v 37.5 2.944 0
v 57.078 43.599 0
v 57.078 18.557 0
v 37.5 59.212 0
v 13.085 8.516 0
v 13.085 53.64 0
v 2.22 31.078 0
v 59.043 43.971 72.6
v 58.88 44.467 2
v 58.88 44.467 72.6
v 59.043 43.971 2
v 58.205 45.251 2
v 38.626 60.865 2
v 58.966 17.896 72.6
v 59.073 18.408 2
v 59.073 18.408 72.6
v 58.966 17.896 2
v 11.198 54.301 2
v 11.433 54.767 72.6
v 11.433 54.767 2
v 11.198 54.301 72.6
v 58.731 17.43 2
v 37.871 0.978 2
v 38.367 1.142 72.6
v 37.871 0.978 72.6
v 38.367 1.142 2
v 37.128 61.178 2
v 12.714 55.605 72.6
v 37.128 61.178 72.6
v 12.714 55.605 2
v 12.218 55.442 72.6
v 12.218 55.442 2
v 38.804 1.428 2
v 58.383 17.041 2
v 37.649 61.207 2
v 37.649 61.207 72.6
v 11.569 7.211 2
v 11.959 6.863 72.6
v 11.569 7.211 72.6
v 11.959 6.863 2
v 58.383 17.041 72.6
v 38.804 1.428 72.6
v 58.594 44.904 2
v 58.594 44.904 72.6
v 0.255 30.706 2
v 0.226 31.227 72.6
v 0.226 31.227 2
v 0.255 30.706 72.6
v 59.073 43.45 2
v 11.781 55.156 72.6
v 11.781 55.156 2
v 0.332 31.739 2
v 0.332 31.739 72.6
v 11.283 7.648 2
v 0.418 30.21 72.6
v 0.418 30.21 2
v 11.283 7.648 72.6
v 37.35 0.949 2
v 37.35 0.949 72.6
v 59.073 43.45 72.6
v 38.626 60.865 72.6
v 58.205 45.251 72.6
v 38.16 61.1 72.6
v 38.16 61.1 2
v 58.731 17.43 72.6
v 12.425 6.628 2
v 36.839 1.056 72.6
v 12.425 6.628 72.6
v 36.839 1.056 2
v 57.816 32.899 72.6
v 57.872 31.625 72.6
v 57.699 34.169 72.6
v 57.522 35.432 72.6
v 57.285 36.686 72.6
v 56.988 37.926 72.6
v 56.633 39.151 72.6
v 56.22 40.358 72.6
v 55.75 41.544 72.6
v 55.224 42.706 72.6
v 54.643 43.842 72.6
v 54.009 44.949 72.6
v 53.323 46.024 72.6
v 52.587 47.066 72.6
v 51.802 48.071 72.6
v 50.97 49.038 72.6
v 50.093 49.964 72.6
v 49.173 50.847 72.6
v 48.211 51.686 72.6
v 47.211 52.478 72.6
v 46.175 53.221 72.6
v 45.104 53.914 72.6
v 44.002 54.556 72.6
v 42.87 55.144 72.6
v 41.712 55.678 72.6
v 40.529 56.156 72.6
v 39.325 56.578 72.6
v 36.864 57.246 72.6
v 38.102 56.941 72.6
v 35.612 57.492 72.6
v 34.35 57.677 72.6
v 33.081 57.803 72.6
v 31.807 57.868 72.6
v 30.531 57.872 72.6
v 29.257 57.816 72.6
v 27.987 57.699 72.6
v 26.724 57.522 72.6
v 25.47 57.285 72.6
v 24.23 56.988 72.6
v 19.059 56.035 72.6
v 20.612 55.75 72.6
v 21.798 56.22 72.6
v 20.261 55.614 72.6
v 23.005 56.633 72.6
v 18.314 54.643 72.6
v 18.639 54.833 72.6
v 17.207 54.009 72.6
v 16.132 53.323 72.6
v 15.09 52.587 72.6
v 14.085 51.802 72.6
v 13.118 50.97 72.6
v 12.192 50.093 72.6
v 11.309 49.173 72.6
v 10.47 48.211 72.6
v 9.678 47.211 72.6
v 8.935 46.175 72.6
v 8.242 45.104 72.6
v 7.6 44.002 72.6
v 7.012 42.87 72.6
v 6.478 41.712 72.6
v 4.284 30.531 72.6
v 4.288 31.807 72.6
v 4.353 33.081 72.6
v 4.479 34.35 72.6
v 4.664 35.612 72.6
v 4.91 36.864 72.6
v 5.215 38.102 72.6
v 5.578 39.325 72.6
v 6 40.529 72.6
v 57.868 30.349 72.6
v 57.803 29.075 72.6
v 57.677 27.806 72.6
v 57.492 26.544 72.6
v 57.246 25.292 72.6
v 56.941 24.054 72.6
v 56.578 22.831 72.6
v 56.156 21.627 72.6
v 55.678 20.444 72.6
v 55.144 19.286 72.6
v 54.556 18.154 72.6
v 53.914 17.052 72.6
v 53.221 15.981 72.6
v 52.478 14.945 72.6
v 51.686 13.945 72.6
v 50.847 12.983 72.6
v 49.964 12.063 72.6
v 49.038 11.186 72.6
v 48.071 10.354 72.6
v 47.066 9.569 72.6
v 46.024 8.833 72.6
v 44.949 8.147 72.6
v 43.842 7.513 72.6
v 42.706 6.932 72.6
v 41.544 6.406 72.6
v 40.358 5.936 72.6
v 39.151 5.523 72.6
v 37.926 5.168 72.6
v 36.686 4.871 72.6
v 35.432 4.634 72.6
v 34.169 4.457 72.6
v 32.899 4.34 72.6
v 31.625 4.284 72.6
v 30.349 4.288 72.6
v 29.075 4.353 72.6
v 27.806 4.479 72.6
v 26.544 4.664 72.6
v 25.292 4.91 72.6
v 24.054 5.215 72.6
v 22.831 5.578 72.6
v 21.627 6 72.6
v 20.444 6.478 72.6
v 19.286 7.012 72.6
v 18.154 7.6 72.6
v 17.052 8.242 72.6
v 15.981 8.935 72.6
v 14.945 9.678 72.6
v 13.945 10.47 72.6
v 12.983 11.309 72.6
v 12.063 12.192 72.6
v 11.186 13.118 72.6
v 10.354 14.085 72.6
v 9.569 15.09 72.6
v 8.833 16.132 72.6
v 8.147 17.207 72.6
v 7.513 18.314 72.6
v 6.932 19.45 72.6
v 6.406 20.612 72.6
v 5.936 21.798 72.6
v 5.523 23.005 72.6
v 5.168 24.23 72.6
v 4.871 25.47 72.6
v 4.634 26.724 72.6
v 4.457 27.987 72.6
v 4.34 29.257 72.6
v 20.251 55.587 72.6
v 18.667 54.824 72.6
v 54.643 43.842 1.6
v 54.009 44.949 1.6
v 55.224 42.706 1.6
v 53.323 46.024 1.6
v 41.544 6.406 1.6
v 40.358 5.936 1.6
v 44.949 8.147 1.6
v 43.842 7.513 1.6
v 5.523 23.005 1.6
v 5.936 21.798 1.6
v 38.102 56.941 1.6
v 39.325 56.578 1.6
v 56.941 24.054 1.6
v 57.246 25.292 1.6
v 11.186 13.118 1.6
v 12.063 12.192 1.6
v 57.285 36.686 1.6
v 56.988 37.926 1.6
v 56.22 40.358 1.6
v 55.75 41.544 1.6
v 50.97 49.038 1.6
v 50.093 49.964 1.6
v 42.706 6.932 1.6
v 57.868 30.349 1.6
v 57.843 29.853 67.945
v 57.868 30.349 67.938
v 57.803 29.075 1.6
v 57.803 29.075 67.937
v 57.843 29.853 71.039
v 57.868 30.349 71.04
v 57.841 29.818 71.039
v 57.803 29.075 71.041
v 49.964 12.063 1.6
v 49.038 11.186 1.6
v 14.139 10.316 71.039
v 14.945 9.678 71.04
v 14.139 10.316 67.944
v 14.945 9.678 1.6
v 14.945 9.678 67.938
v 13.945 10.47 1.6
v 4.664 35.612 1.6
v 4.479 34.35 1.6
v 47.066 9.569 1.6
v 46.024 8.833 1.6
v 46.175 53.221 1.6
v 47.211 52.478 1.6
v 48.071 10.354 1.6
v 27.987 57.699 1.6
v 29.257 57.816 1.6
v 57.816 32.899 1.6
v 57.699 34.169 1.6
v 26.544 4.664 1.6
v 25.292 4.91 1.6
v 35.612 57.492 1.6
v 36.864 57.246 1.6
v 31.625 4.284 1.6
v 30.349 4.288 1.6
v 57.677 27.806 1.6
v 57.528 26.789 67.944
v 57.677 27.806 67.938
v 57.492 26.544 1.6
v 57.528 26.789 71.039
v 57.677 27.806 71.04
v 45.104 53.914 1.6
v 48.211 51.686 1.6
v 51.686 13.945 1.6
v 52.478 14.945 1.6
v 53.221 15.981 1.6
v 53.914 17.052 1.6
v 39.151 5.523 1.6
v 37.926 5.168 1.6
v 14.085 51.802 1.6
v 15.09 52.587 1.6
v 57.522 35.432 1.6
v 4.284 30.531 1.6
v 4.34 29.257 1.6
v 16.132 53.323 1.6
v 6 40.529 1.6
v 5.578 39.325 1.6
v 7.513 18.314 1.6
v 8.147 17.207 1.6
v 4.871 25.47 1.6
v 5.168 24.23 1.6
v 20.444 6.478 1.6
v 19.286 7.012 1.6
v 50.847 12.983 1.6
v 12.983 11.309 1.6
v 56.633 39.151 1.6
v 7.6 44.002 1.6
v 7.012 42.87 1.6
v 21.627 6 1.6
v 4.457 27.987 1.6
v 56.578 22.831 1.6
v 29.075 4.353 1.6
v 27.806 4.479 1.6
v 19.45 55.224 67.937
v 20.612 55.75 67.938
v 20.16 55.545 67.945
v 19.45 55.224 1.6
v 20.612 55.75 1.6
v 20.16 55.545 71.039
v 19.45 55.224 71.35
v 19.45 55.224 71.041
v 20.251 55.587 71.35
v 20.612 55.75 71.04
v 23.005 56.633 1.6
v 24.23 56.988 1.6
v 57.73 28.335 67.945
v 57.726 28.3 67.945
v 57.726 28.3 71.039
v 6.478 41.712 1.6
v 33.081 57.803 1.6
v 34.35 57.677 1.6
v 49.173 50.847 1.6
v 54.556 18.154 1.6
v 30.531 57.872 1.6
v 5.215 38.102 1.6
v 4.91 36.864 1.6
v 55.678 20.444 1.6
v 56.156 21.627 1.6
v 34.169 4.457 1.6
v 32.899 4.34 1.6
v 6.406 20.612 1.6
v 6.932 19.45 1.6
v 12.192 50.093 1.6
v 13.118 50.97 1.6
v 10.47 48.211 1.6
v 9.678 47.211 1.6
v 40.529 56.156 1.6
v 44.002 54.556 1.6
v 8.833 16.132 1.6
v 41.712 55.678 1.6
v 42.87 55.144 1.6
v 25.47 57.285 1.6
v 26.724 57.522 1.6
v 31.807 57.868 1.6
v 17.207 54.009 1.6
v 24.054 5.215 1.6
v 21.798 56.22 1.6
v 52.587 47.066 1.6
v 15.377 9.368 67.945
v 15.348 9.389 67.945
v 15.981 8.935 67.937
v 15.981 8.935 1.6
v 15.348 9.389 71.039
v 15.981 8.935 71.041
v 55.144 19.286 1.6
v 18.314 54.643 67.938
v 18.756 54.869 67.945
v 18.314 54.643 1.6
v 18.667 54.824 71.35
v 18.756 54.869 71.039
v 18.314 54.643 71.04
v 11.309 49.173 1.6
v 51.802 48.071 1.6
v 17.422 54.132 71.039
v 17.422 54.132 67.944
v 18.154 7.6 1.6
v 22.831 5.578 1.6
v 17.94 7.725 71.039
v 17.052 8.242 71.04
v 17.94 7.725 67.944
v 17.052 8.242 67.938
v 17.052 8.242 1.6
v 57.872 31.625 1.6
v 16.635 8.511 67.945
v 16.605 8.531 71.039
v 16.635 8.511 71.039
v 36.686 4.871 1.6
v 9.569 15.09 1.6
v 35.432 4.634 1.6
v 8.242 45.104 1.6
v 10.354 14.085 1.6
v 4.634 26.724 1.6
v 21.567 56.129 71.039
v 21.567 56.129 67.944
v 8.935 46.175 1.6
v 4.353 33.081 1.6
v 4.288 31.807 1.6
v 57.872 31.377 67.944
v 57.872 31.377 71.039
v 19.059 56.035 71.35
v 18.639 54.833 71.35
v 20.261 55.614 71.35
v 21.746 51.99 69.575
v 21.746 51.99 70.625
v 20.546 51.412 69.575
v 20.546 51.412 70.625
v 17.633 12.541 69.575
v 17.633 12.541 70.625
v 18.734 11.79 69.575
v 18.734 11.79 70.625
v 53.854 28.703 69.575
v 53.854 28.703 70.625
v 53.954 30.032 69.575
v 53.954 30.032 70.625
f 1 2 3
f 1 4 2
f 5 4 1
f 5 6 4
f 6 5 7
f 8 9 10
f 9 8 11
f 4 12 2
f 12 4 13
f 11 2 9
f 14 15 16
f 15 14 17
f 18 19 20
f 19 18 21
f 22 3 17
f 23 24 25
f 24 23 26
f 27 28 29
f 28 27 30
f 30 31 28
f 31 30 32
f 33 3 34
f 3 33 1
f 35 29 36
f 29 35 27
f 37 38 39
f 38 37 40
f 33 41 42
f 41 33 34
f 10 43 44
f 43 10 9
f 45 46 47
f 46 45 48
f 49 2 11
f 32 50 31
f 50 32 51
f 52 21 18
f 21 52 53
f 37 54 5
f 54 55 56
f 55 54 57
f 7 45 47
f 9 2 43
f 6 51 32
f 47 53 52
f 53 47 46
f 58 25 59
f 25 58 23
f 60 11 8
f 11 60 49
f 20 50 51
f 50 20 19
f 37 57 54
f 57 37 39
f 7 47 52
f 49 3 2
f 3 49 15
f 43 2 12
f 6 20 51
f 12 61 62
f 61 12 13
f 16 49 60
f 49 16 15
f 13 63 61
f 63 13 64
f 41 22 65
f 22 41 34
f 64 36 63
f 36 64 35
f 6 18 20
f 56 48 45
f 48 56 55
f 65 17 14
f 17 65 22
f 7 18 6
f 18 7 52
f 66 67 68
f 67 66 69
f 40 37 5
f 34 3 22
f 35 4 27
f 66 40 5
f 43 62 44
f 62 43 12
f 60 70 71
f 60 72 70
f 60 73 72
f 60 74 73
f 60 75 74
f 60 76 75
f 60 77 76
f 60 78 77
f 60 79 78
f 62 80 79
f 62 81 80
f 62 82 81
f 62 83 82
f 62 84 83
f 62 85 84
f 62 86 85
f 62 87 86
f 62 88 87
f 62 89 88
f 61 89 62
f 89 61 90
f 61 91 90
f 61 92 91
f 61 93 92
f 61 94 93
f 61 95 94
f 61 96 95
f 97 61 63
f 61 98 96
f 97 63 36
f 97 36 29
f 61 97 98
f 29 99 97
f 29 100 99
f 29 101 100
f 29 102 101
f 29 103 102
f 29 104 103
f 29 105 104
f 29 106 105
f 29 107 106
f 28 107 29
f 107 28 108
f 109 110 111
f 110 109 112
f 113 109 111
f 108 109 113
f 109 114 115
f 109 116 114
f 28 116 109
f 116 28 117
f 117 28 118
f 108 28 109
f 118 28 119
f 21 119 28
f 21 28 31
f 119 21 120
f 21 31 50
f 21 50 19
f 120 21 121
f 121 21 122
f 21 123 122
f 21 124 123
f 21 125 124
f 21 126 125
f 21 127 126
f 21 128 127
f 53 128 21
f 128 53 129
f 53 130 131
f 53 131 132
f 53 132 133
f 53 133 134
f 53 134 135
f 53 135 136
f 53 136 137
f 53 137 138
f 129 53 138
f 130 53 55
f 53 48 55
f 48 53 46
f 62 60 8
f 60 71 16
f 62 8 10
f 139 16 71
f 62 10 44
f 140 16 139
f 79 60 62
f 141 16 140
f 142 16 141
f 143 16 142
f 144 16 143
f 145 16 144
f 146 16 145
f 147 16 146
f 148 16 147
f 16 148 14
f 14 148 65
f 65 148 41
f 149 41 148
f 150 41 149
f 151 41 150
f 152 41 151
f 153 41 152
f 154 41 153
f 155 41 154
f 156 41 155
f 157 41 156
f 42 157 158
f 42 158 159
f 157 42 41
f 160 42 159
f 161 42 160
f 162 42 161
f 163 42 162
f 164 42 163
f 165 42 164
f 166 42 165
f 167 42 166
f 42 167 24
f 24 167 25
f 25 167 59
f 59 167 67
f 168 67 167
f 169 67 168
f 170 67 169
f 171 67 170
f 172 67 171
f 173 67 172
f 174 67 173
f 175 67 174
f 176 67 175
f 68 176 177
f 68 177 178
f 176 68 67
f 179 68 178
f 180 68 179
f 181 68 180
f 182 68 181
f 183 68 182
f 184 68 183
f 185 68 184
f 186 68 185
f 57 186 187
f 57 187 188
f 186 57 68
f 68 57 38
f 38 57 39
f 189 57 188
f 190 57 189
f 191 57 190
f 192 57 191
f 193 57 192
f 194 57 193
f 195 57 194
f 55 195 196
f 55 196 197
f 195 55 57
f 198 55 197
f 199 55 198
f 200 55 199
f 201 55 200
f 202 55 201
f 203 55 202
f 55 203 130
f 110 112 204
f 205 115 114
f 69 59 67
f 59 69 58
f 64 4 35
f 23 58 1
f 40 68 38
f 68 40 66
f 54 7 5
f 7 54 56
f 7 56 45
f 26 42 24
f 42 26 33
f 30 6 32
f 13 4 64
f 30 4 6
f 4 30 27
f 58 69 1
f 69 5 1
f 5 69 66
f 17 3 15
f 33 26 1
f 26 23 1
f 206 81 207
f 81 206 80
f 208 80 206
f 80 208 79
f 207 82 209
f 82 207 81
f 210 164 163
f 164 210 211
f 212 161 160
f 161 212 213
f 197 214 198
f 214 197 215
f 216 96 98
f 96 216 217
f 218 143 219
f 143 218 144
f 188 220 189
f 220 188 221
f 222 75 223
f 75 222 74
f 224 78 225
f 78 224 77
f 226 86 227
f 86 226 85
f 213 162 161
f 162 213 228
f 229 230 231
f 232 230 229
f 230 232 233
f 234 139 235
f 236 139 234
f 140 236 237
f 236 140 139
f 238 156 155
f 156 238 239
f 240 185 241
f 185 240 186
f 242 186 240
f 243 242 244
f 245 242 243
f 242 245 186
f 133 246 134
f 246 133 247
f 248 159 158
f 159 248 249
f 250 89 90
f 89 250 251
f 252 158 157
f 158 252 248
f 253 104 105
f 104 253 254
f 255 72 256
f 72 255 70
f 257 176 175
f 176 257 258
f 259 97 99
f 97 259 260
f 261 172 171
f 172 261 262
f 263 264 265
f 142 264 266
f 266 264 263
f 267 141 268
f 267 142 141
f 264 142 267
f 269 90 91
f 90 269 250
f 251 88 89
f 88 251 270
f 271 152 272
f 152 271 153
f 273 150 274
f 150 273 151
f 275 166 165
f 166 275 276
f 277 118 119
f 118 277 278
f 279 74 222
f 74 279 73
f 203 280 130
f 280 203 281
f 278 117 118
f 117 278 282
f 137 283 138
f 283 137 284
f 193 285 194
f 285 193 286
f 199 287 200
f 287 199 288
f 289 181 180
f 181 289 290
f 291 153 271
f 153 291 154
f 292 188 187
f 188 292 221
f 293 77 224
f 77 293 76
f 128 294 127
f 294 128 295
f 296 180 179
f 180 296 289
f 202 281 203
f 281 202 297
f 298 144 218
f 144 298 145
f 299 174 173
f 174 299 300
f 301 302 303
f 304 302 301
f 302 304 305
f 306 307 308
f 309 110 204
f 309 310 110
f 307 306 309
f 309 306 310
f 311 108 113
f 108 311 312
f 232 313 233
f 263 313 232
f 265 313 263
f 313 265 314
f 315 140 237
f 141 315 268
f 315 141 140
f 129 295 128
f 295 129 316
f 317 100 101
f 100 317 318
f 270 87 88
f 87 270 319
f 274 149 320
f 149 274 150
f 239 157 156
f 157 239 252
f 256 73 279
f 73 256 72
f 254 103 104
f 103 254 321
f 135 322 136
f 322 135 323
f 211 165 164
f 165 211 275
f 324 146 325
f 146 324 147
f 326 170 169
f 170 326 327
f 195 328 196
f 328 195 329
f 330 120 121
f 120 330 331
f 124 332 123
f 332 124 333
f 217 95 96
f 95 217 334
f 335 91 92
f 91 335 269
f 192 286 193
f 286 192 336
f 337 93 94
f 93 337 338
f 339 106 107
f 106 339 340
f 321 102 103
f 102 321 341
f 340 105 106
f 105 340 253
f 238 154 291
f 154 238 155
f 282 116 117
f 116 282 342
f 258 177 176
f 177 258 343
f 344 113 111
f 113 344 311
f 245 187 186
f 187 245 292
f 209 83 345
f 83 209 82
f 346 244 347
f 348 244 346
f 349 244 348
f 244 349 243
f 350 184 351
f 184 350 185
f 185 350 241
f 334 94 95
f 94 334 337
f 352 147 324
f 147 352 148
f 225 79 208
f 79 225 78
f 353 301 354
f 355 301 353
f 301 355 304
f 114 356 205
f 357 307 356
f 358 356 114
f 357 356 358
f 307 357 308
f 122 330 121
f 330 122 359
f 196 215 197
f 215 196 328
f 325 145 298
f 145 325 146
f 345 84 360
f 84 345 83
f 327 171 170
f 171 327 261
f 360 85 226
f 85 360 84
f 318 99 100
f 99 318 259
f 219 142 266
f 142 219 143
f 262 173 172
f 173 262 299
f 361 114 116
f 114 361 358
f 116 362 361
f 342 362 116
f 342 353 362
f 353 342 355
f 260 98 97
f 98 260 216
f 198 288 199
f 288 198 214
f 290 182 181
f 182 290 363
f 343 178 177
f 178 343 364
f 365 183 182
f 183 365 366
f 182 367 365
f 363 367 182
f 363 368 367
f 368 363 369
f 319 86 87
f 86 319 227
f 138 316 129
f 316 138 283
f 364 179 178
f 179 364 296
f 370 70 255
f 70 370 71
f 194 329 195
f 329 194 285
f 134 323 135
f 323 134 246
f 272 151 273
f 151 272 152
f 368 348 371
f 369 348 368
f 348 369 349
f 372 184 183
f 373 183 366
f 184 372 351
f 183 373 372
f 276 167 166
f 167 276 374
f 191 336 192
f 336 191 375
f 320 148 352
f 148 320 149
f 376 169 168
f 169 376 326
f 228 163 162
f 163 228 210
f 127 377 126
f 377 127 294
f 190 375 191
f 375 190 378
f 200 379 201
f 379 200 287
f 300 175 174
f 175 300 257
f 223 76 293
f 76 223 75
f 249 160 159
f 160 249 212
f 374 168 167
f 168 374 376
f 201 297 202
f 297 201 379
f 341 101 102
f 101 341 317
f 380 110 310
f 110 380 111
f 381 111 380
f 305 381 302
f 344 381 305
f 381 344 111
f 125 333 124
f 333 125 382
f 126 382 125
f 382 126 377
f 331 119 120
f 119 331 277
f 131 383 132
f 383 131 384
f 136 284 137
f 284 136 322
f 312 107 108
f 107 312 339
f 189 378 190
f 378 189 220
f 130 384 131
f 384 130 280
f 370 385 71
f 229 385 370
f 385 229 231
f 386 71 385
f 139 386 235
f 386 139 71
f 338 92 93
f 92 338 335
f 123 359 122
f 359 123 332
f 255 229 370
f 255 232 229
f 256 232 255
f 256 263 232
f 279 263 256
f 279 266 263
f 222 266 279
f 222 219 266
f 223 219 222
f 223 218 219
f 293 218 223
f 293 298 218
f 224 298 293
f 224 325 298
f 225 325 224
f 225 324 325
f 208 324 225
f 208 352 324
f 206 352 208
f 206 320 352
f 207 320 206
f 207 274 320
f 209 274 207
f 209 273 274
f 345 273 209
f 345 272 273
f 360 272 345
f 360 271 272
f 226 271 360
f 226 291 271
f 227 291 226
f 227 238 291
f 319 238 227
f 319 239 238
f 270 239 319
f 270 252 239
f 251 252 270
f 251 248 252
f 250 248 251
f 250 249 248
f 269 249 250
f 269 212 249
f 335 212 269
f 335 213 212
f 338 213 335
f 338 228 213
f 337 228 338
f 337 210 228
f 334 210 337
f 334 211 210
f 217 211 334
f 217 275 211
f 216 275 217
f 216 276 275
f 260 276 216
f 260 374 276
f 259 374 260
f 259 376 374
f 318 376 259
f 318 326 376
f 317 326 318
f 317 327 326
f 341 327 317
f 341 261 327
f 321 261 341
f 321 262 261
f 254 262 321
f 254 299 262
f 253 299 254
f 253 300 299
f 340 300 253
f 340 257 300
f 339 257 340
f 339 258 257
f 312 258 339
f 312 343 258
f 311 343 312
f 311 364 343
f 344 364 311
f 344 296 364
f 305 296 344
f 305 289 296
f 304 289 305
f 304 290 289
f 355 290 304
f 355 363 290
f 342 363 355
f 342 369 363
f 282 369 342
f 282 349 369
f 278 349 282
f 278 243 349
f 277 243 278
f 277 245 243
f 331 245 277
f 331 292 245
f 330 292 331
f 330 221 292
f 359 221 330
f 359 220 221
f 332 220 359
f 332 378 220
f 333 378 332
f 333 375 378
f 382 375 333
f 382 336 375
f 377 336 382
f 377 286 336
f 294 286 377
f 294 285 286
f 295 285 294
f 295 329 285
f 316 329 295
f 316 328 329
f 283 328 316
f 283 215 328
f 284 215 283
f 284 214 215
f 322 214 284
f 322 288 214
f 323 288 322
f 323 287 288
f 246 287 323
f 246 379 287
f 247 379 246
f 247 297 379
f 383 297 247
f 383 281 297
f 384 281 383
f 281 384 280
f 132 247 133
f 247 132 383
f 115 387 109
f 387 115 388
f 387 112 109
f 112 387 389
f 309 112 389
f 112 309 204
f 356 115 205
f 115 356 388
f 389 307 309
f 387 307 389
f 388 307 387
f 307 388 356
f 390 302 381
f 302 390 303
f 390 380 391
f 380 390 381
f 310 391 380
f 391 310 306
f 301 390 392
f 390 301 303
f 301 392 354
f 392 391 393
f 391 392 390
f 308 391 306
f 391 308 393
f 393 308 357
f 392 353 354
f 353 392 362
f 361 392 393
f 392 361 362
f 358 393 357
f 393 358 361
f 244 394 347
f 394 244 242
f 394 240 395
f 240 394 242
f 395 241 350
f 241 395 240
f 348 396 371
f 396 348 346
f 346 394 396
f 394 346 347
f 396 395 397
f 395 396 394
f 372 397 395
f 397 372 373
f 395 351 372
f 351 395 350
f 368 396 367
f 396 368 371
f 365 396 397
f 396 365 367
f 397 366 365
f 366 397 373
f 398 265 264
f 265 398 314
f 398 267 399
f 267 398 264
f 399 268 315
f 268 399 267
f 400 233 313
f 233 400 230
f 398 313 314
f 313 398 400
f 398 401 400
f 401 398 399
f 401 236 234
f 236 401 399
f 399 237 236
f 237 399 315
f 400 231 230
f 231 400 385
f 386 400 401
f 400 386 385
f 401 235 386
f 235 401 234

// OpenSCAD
// Puzzlebox by RevK, @TheRealRevK www.me.uk
// Thingiverse examples and instructions https://www.thingiverse.com/thing:2410748
// GitHub source https://github.com/revk/PuzzleBox
// Get new random custom maze gift boxes from https://www.me.uk/puzzlebox
// Created 2022-12-22T07:52:48Z 2001:700:710:aa:8000:0:4:2
// Total parts: m=4
// Part to make: n=4
// Nubs: N=3
// Base height: b=10
// Core diameter for content: c=20
// Core height for content: h=75
// Base thickness: B=1.6
// Base gap (Z clearance): G=0.4
// Wall thickness: w=1.2
// Maze thickness: t=4
// Maze spacing: z=5
// Maze top margin: M=1
// Maze complexity: X=7
// Thickness of park ridge to click closed: p=0.7
// General X/Y clearance: g=0.4
// Number of outer sides: s=7
// Outer rounding on ends: r=2
// Grip depth: R=1.333333
// Text font for end (optional): e=5o
// Text has diagonal edges (very slow): Z
// Scale side text (i.e. if too long): T=1
// Extra clearance on radius for nub: y=0.1
// Extra clearance on height of nub: Z=0.2
module cuttext(){translate([0,0,-1000])minkowski(){rotate([0,0,22.5])cylinder(h=0,d1=0,d2=0,$fn=8);linear_extrude(height=1000,convexity=10)mirror([1,0,0])children();}}
module outer(h,r){e=2000;minkowski(){cylinder(r1=0,r2=e,h=e,$fn=24);cylinder(h=h-e,r=r,$fn=7);}}
scale(0.001){
// Part 4 (26.80mm to 28.00mm and 28.00mm/31.08mm base)
translate([31078,31078,0])
rotate([0,0,25.714286]){
difference(){union(){difference(){
outer(72600,28858);
translate([0,0,1600])cylinder(r=26800,h=72600,$fn=132);
}
}
rotate([0,0,0.000000])translate([0,26800,72600])cylinder(d=1800,h=2500,center=true,$fn=4);
}
rotate([0,0,0.000000])for(a=[0:120.000000:359])rotate([0,0,a])polyhedron(points=[[2344,26798,67900],[782,26889,67900],[-782,26889,67900],[-2344,26798,67900],[2344,26798,69575],[666,22890,69575],[-666,22890,69575],[-2344,26798,69575],[2344,26798,70625],[666,22890,70625],[-666,22890,70625],[-2344,26798,70625],[2344,26798,71050],[782,26889,71050],[-782,26889,71050],[-2344,26798,71050],[2371,27096,67900],[791,27188,67900],[-791,27188,67900],[-2371,27096,67900],[2371,27096,69575],[791,27188,69575],[-791,27188,69575],[-2371,27096,69575],[2371,27096,70625],[791,27188,70625],[-791,27188,70625],[-2371,27096,70625],[2371,27096,71050],[791,27188,71050],[-791,27188,71050],[-2371,27096,71050],],faces=[[20,21,17],[20,17,16],[21,22,18],[21,18,17],[22,23,19],[22,19,18],[24,25,21],[24,21,20],[25,26,22],[25,22,21],[26,27,23],[26,23,22],[28,29,25],[28,25,24],[29,30,26],[29,26,25],[30,31,27],[30,27,26],[4,20,16],[4,16,0],[23,7,3],[23,3,19],[8,24,20],[8,20,4],[27,11,7],[27,7,23],[12,28,24],[12,24,8],[31,15,11],[31,11,27],[28,12,13],[28,13,29],[0,16,17],[0,17,1],[29,13,14],[29,14,30],[1,17,18],[1,18,2],[30,14,15],[30,15,31],[2,18,19],[2,19,3],[0,1,5],[0,5,4],[4,5,9],[4,9,8],[8,9,12],[9,13,12],[1,2,6],[1,6,5],[5,6,10],[5,10,9],[9,10,14],[9,14,13],[2,3,6],[3,7,6],[6,7,11],[6,11,10],[10,11,15],[10,15,14],]);
}
}
